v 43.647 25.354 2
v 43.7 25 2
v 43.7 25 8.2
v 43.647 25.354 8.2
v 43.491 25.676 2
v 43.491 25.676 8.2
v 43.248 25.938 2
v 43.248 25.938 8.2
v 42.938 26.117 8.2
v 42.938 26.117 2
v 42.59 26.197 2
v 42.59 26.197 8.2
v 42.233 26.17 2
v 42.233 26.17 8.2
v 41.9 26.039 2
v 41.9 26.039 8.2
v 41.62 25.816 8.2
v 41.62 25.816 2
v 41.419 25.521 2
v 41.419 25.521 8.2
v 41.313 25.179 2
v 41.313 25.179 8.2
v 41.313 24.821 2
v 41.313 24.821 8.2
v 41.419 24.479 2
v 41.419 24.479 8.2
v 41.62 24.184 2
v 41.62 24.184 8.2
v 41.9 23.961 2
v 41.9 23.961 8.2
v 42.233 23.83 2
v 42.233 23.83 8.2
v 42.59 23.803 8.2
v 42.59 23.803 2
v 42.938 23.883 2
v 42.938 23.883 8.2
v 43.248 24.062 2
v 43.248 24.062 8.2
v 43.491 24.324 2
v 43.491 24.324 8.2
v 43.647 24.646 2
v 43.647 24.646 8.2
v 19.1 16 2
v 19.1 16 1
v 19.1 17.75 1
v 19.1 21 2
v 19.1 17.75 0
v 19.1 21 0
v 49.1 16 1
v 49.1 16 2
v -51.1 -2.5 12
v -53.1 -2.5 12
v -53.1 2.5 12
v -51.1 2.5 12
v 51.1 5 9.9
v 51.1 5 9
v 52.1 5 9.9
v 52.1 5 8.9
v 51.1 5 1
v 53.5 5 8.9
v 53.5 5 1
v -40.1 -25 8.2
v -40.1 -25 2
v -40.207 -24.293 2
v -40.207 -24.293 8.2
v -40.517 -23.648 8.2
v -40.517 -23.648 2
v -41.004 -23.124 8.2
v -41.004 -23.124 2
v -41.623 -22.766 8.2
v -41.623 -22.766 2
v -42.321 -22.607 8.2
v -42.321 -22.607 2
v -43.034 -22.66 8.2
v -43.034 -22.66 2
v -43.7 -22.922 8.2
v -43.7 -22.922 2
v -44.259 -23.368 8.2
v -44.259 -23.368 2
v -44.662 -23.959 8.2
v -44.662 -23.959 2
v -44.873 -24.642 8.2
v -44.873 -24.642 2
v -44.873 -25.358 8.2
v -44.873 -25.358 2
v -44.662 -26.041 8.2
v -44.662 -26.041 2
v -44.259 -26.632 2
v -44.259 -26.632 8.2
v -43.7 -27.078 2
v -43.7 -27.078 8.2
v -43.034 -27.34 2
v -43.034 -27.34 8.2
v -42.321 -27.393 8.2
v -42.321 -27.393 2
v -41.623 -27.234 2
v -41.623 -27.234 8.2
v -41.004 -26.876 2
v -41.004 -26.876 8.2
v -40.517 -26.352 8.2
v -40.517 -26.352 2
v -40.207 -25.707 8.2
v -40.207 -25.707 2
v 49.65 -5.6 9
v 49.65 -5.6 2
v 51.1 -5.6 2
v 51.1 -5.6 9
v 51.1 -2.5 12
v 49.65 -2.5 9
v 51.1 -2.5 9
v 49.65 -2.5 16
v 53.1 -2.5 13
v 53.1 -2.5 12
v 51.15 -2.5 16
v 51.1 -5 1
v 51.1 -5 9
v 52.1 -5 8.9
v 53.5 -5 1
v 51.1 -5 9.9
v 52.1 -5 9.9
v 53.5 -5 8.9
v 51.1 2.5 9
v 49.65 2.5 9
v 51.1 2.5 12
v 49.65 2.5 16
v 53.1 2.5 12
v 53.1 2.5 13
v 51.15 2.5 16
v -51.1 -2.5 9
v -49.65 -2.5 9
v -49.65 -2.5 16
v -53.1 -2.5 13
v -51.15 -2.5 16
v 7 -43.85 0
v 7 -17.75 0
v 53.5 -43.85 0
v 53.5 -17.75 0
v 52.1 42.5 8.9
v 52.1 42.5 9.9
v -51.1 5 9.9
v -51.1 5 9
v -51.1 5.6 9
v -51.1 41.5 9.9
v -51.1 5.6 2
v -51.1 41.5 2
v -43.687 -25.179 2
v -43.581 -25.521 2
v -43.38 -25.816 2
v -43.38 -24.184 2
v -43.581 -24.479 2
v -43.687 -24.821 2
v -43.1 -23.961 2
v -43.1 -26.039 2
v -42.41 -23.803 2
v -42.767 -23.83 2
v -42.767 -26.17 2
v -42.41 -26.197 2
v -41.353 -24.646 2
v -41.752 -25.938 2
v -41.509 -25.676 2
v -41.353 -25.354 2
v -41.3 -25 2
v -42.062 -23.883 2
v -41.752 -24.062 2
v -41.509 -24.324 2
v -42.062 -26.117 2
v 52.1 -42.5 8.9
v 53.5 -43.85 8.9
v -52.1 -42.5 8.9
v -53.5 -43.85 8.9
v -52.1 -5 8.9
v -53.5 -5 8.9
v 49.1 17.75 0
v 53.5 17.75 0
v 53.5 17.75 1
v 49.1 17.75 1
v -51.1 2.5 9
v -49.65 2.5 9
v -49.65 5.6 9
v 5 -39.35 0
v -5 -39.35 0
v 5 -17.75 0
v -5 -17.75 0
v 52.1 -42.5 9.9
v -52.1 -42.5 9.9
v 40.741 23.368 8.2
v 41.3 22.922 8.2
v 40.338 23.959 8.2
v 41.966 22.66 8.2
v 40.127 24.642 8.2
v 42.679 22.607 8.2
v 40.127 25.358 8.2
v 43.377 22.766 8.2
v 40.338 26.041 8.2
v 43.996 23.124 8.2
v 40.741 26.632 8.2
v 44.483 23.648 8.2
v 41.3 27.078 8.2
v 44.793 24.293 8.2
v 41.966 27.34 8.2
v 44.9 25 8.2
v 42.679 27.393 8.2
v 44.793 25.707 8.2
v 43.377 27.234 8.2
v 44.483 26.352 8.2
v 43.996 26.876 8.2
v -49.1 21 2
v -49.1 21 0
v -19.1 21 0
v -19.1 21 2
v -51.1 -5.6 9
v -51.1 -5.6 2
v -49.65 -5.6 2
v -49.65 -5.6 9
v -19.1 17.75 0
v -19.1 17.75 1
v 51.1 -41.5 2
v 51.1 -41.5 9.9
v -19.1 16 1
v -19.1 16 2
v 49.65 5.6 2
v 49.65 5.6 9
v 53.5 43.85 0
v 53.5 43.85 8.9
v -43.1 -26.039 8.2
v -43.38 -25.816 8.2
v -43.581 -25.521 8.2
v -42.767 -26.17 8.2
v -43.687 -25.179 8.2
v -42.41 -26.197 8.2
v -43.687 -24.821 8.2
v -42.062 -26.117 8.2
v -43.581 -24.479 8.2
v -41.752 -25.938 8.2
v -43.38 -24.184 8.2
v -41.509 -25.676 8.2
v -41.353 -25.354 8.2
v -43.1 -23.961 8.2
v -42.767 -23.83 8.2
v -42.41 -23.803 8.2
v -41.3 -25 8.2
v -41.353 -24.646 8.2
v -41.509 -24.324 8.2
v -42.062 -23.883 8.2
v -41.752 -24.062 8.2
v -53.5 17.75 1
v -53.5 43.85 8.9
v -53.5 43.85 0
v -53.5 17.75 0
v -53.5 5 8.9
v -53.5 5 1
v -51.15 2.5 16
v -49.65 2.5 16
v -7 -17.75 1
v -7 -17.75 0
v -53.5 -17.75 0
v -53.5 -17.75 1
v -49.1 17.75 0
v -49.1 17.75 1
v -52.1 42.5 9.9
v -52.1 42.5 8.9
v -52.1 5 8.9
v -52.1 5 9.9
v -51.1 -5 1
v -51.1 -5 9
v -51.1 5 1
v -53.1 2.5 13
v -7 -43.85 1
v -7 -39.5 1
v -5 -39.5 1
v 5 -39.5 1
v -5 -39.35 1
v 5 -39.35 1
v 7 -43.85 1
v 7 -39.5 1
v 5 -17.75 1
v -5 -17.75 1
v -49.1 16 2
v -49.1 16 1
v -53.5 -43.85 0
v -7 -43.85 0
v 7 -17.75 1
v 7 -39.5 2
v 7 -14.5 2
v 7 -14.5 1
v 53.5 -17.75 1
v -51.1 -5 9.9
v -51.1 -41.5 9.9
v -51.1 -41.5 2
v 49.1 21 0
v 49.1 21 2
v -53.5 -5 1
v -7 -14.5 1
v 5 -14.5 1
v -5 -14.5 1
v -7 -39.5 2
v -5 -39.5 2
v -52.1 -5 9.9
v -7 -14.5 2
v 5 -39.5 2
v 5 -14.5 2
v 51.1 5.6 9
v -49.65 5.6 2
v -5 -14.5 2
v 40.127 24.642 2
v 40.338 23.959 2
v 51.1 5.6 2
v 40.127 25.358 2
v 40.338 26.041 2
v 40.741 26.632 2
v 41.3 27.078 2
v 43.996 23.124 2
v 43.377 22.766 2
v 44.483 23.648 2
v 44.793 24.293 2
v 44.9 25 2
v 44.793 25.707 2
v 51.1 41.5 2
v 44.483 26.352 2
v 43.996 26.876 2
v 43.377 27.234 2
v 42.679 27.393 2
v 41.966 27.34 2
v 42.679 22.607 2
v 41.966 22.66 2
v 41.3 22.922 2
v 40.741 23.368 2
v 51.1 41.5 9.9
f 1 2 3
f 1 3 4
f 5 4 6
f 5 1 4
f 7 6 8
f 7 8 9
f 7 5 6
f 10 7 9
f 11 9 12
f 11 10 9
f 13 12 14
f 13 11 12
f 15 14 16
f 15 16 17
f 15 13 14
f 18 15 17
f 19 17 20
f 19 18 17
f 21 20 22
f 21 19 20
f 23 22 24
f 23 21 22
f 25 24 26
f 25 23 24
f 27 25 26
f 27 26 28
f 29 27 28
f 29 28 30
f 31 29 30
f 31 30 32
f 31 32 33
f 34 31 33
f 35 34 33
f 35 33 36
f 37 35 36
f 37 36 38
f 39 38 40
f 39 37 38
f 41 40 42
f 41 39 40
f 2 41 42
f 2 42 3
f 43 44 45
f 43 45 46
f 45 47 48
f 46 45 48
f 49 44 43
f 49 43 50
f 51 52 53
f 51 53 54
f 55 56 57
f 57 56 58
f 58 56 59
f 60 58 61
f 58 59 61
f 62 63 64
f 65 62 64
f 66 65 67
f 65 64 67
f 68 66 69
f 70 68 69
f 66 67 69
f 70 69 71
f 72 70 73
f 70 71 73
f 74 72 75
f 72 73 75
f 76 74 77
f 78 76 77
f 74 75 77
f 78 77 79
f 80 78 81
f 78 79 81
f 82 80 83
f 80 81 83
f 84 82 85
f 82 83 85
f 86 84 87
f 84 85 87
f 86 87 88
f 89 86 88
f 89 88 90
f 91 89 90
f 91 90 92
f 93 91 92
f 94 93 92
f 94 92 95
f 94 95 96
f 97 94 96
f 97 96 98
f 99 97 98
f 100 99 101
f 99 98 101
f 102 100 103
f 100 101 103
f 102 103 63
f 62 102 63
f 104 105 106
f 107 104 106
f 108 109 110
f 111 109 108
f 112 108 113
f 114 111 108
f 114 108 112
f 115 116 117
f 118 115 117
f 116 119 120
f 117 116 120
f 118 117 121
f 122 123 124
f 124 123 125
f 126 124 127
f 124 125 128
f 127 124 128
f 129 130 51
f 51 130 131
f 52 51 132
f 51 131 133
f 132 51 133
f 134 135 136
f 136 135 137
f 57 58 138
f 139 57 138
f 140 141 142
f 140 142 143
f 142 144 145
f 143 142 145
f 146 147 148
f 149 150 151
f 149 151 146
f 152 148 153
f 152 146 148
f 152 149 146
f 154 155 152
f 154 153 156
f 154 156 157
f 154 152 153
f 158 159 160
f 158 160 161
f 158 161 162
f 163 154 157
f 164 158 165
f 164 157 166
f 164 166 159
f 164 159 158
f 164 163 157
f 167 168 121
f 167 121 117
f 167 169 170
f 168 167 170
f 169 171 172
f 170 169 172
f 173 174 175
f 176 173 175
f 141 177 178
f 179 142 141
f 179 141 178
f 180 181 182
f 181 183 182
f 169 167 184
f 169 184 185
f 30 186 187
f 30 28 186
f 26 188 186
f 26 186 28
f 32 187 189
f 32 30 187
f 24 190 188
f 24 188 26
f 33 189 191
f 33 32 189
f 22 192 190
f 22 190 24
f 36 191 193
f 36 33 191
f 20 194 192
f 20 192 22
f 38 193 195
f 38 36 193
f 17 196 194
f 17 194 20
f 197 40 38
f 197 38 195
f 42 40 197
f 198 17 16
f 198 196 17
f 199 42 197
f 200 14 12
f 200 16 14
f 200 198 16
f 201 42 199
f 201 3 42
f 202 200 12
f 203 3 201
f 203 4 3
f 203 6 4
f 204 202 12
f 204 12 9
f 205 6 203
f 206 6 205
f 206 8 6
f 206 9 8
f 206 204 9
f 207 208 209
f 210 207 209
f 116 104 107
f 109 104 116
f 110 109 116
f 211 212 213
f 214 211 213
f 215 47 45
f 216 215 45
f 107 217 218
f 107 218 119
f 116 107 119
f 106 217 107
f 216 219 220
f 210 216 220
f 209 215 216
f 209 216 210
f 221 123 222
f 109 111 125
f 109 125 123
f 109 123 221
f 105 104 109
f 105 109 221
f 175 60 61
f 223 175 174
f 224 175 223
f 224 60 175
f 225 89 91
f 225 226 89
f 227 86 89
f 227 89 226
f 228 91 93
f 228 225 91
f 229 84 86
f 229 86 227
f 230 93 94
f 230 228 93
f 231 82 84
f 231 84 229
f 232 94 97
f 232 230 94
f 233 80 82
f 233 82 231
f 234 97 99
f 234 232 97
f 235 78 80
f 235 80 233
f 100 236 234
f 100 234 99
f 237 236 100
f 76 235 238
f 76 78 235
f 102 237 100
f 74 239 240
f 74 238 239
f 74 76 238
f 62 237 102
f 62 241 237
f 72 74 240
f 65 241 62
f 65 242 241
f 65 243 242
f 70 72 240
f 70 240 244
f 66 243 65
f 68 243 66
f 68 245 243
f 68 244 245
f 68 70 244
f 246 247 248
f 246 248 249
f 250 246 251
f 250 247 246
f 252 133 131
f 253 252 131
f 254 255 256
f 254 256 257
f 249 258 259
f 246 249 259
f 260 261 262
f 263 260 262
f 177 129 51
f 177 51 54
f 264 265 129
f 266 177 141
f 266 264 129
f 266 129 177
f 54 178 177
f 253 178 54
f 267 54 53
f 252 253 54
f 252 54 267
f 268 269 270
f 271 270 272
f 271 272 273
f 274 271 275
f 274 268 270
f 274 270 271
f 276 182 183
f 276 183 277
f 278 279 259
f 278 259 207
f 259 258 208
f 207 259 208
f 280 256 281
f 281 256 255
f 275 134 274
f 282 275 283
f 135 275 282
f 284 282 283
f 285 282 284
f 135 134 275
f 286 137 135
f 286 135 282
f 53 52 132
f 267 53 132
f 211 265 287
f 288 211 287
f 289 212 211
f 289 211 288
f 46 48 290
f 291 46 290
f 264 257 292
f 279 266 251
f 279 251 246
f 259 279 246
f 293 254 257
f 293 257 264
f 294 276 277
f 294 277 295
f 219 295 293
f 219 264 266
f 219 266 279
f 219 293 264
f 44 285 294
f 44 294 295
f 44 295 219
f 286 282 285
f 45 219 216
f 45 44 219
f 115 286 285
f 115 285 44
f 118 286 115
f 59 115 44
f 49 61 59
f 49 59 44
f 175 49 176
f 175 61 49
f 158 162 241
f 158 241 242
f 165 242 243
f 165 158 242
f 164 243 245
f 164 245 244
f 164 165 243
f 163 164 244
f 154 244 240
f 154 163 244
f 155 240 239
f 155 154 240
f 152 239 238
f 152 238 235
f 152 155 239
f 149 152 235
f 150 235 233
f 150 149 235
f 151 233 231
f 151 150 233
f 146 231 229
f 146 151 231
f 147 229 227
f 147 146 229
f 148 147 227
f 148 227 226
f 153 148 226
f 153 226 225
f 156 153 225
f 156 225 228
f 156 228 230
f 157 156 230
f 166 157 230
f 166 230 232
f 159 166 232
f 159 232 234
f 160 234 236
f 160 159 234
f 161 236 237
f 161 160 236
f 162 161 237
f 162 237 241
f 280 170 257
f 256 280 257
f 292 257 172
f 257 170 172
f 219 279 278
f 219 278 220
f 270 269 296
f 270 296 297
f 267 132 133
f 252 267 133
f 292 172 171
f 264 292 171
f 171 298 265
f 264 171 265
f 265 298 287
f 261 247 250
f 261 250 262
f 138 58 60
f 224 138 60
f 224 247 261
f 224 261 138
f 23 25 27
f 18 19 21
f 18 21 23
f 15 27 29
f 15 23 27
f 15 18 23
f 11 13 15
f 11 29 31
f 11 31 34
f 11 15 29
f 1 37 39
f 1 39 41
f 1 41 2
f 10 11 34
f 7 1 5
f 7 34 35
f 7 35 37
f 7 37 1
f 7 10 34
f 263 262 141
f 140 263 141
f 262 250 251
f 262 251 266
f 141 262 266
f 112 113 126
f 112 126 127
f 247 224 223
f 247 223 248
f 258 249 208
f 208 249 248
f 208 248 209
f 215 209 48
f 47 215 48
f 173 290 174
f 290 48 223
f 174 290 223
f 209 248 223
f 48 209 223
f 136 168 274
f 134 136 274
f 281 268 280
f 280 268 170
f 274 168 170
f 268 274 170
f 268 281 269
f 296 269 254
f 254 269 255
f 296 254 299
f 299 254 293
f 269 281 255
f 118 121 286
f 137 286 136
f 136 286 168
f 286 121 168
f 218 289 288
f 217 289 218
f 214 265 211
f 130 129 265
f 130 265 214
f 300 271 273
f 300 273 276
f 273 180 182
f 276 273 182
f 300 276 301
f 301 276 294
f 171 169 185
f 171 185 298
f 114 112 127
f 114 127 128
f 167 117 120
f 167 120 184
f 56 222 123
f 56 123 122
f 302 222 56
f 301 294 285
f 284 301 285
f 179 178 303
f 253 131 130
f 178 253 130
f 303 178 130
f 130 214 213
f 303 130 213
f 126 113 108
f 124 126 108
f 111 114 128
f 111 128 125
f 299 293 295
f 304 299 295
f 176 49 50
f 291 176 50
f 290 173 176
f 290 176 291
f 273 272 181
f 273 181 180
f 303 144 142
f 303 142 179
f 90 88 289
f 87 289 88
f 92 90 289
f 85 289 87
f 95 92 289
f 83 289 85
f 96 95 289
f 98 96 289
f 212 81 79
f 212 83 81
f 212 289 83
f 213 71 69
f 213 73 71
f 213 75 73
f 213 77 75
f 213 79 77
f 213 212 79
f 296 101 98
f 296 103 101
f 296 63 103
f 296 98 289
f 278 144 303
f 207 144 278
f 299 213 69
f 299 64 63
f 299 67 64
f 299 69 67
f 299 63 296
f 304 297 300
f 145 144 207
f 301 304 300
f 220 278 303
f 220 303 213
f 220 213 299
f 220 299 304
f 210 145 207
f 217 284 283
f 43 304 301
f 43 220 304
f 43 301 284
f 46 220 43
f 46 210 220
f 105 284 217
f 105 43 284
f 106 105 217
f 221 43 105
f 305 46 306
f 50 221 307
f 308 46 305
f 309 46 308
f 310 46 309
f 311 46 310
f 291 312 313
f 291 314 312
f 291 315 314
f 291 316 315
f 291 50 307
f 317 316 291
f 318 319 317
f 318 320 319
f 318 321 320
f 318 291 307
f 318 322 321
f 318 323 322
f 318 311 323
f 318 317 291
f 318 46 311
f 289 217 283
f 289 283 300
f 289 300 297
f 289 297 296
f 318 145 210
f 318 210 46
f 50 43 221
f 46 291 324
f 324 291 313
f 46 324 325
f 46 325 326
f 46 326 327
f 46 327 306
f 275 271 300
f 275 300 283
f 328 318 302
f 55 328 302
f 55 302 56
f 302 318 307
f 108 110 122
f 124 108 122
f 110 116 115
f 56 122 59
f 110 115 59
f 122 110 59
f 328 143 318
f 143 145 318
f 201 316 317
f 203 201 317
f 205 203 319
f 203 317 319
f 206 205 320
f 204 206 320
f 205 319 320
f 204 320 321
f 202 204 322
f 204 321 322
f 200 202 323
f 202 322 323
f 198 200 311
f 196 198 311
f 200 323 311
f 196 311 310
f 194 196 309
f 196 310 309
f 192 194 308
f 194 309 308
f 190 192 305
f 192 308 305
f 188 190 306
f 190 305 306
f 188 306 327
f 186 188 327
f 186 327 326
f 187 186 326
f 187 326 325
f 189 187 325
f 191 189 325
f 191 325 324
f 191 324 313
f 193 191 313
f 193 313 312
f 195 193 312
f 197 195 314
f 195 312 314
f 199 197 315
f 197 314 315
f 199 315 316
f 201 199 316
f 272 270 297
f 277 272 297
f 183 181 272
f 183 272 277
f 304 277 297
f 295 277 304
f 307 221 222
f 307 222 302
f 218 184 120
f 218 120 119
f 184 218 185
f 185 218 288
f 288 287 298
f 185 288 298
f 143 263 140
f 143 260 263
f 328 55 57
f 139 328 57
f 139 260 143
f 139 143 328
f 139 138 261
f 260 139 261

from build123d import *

# Parameters (mm, degrees)
SKETCH_W          = 102.2
SKETCH_H          = 83
SKETCH_W_2        = 30
SKETCH_H_2        = 5
SKETCH_W_3        = 2
SKETCH_H_3        = 25
PAD_DEPTH         = 2
SKETCH001_R       = 2.4
SKETCH001_R_2     = 1.2
PAD001_DEPTH      = 6.2
PAD002_DEPTH      = 6.9
PAD002_DEPTH_BACK = 2
PAD003_DEPTH      = 1
SKETCH004_W       = 1.45
SKETCH004_H       = 11.2
PAD004_DEPTH      = 7
SKETCH005_W       = 1.45
SKETCH005_H       = 5
PAD005_DEPTH      = 3
PAD006_DEPTH      = 5
SKETCH008_W       = 35.5
SKETCH008_H       = 1
POCKET_DEPTH      = 107.001
SKETCH009_W       = 14
SKETCH009_H       = 1
POCKET001_DEPTH   = 4.5


with BuildPart() as part:
    # Sketch → Pad (new body)
    with BuildSketch(Plane.XY):
        Rectangle(SKETCH_W, SKETCH_H)
        with Locations((34.1, 18.5)):
            Rectangle(SKETCH_W_2, SKETCH_H_2, mode=Mode.SUBTRACT)
        with Locations((6, -27)):
            Rectangle(SKETCH_W_3, SKETCH_H_3, mode=Mode.SUBTRACT)
        with Locations((-34.1, 18.5)):
            Rectangle(SKETCH_W_2, SKETCH_H_2, mode=Mode.SUBTRACT)
        with Locations((-6, -27)):
            Rectangle(SKETCH_W_3, SKETCH_H_3, mode=Mode.SUBTRACT)
    extrude(amount=PAD_DEPTH)

    # Sketch001 (on Face22 of Pad) → Pad001 (join)
    with BuildSketch(Plane.XY.offset(2)):
        with Locations((-42.5, -25)):
            Circle(SKETCH001_R)
        with Locations((-42.5, -25)):
            Circle(SKETCH001_R_2, mode=Mode.SUBTRACT)
        with Locations((42.5, 25)):
            Circle(SKETCH001_R)
        with Locations((42.5, 25)):
            Circle(SKETCH001_R_2, mode=Mode.SUBTRACT)
    extrude(amount=PAD001_DEPTH)

    # Sketch002 (on Face5 of Pad001) → Pad002 (join, two sides)
    with BuildSketch(Plane.XY.offset(2)) as pad002_sk:
        Polygon((51.1, 5), (53.5, 5), (53.5, 43.85), (-53.5, 43.85), (-53.5, 5), (-51.1, 5), (-51.1, 41.5), (51.1, 41.5), align=None)
        Polygon((51.1, -5), (53.5, -5), (53.5, -43.85), (-53.5, -43.85), (-53.5, -5), (-51.1, -5), (-51.1, -41.5), (51.1, -41.5), align=None)
    extrude(amount=PAD002_DEPTH)
    extrude(pad002_sk.sketch, amount=-PAD002_DEPTH_BACK)

    # Sketch003 (on Face33 of Pad002) → Pad003 (join)
    with BuildSketch(Plane.XY.offset(8.9)):
        Polygon((-52.1, 5), (-51.1, 5), (-51.1, 41.5), (51.1, 41.5), (51.1, 5), (52.1, 5), (52.1, 42.5), (-52.1, 42.5), align=None)
        Polygon((-52.1, -5), (-51.1, -5), (-51.1, -41.5), (51.1, -41.5), (51.1, -5), (52.1, -5), (52.1, -42.5), (-52.1, -42.5), align=None)
    extrude(amount=PAD003_DEPTH)

    # Sketch004 (on Face3 of Pad003) → Pad004 (join)
    with BuildSketch(Plane.XY.offset(2)):
        with Locations((50.375, 0)):
            Rectangle(SKETCH004_W, SKETCH004_H)
        with Locations((-50.375, 0)):
            Rectangle(SKETCH004_W, SKETCH004_H)
    extrude(amount=PAD004_DEPTH)

    # Sketch005 (on Face49 of Pad004) → Pad005 (join)
    with BuildSketch(Plane.XY.offset(9)):
        with Locations((50.375, 0)):
            Rectangle(SKETCH005_W, SKETCH005_H)
        with Locations((-50.375, 0)):
            Rectangle(SKETCH005_W, SKETCH005_H)
    extrude(amount=PAD005_DEPTH)

    # Sketch006 (on Face45 of Pad005) → Pad006 (join)
    with BuildSketch(Plane.XZ.offset(2.5)):
        Polygon((-51.10001, 12), (-53.10001, 12), (-53.10001, 13), (-51.15, 16), (-49.65, 16), (-49.65, 12), align=None)
    pad006 = extrude(amount=-PAD006_DEPTH)

    # Mirrored: Pad006 across YZ
    add(pad006.mirror(Plane.YZ))

    # Sketch008 (on Face47 of Mirrored) → Pocket (cut, through all)
    with BuildSketch(Plane.YZ.offset(53.5)):
        with Locations((0, 0.5)):
            Rectangle(SKETCH008_W, SKETCH008_H)
    extrude(amount=-POCKET_DEPTH, mode=Mode.SUBTRACT)

    # Sketch009 (on Face74 of Pocket) → Pocket001 (cut)
    with BuildSketch(Plane.XZ.offset(43.85)):
        with Locations((0, 0.5)):
            Rectangle(SKETCH009_W, SKETCH009_H)
    extrude(amount=-POCKET001_DEPTH, mode=Mode.SUBTRACT)


solid = part.part
